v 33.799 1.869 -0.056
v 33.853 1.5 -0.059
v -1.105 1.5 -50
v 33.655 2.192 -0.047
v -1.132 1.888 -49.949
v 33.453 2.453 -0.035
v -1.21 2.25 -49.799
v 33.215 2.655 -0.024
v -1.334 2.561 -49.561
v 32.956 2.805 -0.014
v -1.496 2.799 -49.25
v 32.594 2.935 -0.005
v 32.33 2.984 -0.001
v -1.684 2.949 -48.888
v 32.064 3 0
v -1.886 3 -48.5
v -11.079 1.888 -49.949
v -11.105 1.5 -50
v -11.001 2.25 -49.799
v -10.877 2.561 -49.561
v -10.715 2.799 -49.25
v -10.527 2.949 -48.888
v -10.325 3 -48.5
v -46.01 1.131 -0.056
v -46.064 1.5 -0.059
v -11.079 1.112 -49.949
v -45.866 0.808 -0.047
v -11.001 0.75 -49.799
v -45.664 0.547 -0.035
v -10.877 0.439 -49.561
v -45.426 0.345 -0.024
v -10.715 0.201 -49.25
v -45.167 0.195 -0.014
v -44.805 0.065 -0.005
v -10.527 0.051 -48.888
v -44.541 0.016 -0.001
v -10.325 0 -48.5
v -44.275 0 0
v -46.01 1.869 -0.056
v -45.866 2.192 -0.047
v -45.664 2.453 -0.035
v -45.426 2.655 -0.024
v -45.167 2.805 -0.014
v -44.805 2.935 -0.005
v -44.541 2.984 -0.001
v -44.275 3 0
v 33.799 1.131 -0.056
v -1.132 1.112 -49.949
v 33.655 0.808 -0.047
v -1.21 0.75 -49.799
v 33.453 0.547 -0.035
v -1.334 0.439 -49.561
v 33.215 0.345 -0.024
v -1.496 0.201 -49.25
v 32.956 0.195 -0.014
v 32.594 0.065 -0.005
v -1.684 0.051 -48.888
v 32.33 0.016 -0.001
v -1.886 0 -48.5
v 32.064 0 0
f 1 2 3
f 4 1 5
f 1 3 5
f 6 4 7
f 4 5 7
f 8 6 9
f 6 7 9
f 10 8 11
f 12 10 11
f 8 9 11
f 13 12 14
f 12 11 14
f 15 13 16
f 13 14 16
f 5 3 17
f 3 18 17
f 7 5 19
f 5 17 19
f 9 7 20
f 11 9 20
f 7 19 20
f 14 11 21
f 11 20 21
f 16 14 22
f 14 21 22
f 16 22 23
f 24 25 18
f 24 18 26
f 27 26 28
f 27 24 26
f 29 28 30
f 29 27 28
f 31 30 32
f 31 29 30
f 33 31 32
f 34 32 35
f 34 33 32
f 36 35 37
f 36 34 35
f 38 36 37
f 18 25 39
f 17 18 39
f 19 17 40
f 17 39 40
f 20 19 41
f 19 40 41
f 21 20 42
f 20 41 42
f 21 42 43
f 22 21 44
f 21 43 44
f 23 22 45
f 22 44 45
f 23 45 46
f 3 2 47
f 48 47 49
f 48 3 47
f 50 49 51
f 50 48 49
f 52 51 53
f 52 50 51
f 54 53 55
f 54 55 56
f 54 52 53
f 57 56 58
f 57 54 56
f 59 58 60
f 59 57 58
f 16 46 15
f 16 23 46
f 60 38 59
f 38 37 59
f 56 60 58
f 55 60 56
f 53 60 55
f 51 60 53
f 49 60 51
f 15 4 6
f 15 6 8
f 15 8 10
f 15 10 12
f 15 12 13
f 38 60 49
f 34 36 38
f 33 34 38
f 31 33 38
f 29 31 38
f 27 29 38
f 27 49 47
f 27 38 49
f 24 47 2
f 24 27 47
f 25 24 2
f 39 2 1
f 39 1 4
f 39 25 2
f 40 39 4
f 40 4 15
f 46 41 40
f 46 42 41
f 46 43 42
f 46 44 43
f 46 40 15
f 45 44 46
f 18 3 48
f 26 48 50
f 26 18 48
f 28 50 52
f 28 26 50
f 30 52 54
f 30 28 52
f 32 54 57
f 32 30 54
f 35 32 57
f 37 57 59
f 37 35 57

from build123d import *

# Parameters (mm, degrees)
EXTRUDE_1_DEPTH          = 3
FILLET_1_R               = 1.5
CUT_EXTRUDE_1_DEPTH      = 69.078755293
CUT_EXTRUDE_1_DEPTH_BACK = 69.078755293
SKETCH_2_R               = 19


with BuildPart() as part:
    # Эскиз1 → Бобышка-Вытянуть1 (new body)
    with BuildSketch(Plane(origin=(0, 0, 0), x_dir=(1, 0, 0), z_dir=(0, 1, 0))):
        Polygon((-46.105497744, 0), (33.894502256, 0), (-1.105497744, 50), (-11.105497744, 50), align=None)
    extrude(amount=EXTRUDE_1_DEPTH)

    # Скругление1
    fillet_1_edges = [part.edges().sort_by_distance(p)[0] for p in [
        (16.394502256, 0, -25),
        (16.394502256, 3, -25),
        (-28.605497744, 0, -25),
        (-28.605497744, 3, -25),
        (-6.105497744, 0, -50),
        (-6.105497744, 3, -50),
    ]]
    fillet(fillet_1_edges, radius=FILLET_1_R - 0.0001)  # a hair under: the kernel refuses the full size

    # Эскиз2 → Вырез-Вытянуть1 (cut, two sides: drawn at the far end of the back side and taken through both)
    with BuildSketch(Plane(origin=(0, 0, 0), x_dir=(0, 0, -1), z_dir=(1, 0, 0)).offset(-CUT_EXTRUDE_1_DEPTH_BACK)):
        with Locations((-18.940696925, 1.5)):
            Circle(SKETCH_2_R)
    extrude(amount=CUT_EXTRUDE_1_DEPTH + CUT_EXTRUDE_1_DEPTH_BACK, mode=Mode.SUBTRACT)


solid = part.part
